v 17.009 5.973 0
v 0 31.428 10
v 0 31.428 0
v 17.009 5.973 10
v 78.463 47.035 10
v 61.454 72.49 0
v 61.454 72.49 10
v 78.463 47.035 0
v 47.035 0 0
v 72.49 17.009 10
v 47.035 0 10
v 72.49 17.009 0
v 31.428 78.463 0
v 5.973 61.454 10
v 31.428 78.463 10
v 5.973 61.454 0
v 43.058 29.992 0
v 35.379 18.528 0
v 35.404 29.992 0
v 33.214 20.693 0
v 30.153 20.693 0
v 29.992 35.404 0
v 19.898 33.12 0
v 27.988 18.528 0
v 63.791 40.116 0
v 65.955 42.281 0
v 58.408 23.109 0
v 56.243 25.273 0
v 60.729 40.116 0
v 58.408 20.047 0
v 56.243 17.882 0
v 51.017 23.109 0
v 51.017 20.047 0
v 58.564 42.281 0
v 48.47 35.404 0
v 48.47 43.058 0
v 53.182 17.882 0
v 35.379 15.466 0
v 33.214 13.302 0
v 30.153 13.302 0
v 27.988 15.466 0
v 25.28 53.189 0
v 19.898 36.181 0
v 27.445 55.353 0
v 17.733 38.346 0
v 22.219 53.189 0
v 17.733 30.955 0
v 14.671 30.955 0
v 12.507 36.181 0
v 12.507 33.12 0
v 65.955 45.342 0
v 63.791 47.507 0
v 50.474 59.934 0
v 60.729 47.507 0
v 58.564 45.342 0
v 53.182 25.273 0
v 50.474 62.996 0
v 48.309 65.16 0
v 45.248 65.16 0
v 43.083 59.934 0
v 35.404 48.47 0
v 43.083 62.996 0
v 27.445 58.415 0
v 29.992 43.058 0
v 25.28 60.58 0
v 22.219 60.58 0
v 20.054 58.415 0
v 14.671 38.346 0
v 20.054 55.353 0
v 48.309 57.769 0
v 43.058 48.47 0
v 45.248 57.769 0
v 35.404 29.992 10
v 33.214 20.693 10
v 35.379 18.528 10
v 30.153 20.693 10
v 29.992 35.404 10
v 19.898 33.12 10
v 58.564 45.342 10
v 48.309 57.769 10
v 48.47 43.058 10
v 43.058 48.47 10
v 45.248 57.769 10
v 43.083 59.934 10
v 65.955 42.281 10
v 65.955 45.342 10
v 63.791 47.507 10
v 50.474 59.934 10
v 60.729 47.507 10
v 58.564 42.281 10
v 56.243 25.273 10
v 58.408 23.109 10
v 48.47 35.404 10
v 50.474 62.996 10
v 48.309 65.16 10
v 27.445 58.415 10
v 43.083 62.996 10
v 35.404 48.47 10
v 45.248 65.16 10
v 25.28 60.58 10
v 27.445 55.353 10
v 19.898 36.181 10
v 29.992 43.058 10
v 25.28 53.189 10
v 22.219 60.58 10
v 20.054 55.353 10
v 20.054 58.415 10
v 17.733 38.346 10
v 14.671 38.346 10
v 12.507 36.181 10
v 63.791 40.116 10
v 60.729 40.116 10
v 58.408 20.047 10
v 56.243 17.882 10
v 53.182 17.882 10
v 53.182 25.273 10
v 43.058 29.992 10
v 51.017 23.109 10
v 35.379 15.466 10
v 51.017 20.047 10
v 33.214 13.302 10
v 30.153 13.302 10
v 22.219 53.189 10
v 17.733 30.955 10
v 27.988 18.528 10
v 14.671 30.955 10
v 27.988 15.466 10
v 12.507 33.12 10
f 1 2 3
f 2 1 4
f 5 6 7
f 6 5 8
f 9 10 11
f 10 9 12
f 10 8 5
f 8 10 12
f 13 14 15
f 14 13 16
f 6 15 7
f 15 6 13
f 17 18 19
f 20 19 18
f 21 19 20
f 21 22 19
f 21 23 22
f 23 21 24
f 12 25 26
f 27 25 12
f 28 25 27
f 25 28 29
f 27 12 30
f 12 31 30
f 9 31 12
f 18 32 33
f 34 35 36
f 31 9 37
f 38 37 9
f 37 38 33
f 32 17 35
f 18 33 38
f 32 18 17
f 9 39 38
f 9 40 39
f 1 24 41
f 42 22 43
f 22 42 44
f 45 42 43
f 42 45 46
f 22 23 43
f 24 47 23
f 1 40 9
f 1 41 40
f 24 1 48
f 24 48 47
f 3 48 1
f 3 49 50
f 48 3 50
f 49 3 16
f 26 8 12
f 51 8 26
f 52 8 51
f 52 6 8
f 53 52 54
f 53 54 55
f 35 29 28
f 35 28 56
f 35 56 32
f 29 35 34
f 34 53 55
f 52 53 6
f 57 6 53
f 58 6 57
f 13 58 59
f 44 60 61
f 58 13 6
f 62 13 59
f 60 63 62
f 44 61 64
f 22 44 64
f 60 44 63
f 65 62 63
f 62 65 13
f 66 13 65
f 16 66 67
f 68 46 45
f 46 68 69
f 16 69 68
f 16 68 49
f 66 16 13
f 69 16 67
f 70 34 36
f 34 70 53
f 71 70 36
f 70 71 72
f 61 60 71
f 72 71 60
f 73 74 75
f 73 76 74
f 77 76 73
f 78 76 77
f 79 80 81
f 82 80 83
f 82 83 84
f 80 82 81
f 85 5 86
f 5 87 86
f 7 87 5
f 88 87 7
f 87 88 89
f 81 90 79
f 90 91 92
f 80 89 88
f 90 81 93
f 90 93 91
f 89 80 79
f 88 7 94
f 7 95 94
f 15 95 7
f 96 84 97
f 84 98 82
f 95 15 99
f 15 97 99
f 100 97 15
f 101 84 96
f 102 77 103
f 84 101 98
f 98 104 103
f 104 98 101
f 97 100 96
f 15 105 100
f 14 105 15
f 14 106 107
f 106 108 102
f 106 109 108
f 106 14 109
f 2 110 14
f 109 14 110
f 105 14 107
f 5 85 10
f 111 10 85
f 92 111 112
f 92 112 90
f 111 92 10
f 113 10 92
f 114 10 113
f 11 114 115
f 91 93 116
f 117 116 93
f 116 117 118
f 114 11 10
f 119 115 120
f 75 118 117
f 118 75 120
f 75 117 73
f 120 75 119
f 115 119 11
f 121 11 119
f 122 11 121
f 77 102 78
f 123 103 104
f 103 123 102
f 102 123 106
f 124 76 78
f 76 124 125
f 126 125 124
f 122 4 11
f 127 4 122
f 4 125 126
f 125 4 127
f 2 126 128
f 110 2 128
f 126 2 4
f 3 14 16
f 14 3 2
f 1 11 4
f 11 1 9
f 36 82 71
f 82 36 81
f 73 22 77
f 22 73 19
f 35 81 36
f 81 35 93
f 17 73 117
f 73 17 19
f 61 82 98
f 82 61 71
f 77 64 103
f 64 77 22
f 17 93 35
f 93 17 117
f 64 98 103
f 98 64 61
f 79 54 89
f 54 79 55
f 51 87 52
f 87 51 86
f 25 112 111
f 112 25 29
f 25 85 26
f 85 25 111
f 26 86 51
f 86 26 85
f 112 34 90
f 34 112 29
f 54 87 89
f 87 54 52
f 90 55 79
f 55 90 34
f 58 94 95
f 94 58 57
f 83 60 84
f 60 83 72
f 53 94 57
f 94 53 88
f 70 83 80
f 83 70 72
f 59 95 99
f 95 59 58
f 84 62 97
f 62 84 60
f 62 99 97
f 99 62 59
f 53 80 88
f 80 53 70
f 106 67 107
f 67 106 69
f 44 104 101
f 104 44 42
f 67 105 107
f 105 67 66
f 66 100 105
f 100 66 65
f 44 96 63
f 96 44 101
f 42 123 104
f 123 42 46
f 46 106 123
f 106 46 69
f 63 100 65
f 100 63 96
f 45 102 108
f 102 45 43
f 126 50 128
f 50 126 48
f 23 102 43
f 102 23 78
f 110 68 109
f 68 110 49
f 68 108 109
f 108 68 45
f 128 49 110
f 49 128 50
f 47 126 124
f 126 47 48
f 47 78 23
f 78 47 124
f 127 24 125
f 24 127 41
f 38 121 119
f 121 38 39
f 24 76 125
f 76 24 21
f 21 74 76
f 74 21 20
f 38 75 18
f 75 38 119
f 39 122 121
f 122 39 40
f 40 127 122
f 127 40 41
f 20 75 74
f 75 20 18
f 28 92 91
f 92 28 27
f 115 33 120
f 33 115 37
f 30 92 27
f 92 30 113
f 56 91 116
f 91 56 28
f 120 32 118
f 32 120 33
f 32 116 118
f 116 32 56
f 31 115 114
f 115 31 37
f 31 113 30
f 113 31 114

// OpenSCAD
$fn = 32;

// ----------------------------------------------------------------------
// Polygon plate: 8-gon R40, 6 bolt windows
// ----------------------------------------------------------------------

// --- parameters (mm) ---
sides = 8;                // number of polygon sides
plate_r = 40;             // circumscribed radius of the polygon
bore_r = 10;              // centre bore radius
bolts = 6;                // number of bolt windows
ring_r = 23.48;           // bolt-circle radius
bolt_r = 4;               // bolt window radius
plate_t = 10;             // plate thickness, Z (extrusion height)
fit_tol = 0.05;           // declared fit tolerance (prompt contract)
free_tol = 0.2;           // declared free tolerance (prompt contract)

plate_d = 2 * plate_r;  // circumscribed diameter
bore_d = 2 * bore_r;  // centre bore diameter
bolt_d = 2 * bolt_r;  // bolt window diameter
ring_d = 2 * ring_r;  // bolt-circle diameter

profile = [[78.463, 47.035], [61.454, 72.49], [31.428, 78.463], [5.973, 61.454], [0, 31.428], [17.009, 5.973], [47.035, 0], [72.49, 17.009]];  // primary outline, 8 points, counter clockwise
void_1 = [[48.47, 43.058], [43.058, 48.47], [35.404, 48.47], [29.992, 43.058], [29.992, 35.404], [35.404, 29.992], [43.058, 29.992], [48.47, 35.404]];  // centre bore, 8 points
void_2 = [[65.955, 45.342], [63.791, 47.507], [60.729, 47.507], [58.564, 45.342], [58.564, 42.281], [60.729, 40.116], [63.791, 40.116], [65.955, 42.281]];  // bolt window 1, 8 points
void_3 = [[50.474, 62.996], [48.309, 65.16], [45.248, 65.16], [43.083, 62.996], [43.083, 59.934], [45.248, 57.769], [48.309, 57.769], [50.474, 59.934]];  // bolt window 2, 8 points
void_4 = [[27.445, 58.415], [25.28, 60.58], [22.219, 60.58], [20.054, 58.415], [20.054, 55.353], [22.219, 53.189], [25.28, 53.189], [27.445, 55.353]];  // bolt window 3, 8 points
void_5 = [[19.898, 36.181], [17.733, 38.346], [14.671, 38.346], [12.507, 36.181], [12.507, 33.12], [14.671, 30.955], [17.733, 30.955], [19.898, 33.12]];  // bolt window 4, 8 points
void_6 = [[35.379, 18.528], [33.214, 20.693], [30.153, 20.693], [27.988, 18.528], [27.988, 15.466], [30.153, 13.302], [33.214, 13.302], [35.379, 15.466]];  // bolt window 5, 8 points
void_7 = [[58.408, 23.109], [56.243, 25.273], [53.182, 25.273], [51.017, 23.109], [51.017, 20.047], [53.182, 17.882], [56.243, 17.882], [58.408, 20.047]];  // bolt window 6, 8 points

// --- the one profile operation ---
difference() {
  linear_extrude(height = plate_t) polygon(points = profile);
  translate([0, 0, -1])
    linear_extrude(height = plate_t + 2) polygon(points = void_1);
  translate([0, 0, -1])
    linear_extrude(height = plate_t + 2) polygon(points = void_2);
  translate([0, 0, -1])
    linear_extrude(height = plate_t + 2) polygon(points = void_3);
  translate([0, 0, -1])
    linear_extrude(height = plate_t + 2) polygon(points = void_4);
  translate([0, 0, -1])
    linear_extrude(height = plate_t + 2) polygon(points = void_5);
  translate([0, 0, -1])
    linear_extrude(height = plate_t + 2) polygon(points = void_6);
  translate([0, 0, -1])
    linear_extrude(height = plate_t + 2) polygon(points = void_7);
}
